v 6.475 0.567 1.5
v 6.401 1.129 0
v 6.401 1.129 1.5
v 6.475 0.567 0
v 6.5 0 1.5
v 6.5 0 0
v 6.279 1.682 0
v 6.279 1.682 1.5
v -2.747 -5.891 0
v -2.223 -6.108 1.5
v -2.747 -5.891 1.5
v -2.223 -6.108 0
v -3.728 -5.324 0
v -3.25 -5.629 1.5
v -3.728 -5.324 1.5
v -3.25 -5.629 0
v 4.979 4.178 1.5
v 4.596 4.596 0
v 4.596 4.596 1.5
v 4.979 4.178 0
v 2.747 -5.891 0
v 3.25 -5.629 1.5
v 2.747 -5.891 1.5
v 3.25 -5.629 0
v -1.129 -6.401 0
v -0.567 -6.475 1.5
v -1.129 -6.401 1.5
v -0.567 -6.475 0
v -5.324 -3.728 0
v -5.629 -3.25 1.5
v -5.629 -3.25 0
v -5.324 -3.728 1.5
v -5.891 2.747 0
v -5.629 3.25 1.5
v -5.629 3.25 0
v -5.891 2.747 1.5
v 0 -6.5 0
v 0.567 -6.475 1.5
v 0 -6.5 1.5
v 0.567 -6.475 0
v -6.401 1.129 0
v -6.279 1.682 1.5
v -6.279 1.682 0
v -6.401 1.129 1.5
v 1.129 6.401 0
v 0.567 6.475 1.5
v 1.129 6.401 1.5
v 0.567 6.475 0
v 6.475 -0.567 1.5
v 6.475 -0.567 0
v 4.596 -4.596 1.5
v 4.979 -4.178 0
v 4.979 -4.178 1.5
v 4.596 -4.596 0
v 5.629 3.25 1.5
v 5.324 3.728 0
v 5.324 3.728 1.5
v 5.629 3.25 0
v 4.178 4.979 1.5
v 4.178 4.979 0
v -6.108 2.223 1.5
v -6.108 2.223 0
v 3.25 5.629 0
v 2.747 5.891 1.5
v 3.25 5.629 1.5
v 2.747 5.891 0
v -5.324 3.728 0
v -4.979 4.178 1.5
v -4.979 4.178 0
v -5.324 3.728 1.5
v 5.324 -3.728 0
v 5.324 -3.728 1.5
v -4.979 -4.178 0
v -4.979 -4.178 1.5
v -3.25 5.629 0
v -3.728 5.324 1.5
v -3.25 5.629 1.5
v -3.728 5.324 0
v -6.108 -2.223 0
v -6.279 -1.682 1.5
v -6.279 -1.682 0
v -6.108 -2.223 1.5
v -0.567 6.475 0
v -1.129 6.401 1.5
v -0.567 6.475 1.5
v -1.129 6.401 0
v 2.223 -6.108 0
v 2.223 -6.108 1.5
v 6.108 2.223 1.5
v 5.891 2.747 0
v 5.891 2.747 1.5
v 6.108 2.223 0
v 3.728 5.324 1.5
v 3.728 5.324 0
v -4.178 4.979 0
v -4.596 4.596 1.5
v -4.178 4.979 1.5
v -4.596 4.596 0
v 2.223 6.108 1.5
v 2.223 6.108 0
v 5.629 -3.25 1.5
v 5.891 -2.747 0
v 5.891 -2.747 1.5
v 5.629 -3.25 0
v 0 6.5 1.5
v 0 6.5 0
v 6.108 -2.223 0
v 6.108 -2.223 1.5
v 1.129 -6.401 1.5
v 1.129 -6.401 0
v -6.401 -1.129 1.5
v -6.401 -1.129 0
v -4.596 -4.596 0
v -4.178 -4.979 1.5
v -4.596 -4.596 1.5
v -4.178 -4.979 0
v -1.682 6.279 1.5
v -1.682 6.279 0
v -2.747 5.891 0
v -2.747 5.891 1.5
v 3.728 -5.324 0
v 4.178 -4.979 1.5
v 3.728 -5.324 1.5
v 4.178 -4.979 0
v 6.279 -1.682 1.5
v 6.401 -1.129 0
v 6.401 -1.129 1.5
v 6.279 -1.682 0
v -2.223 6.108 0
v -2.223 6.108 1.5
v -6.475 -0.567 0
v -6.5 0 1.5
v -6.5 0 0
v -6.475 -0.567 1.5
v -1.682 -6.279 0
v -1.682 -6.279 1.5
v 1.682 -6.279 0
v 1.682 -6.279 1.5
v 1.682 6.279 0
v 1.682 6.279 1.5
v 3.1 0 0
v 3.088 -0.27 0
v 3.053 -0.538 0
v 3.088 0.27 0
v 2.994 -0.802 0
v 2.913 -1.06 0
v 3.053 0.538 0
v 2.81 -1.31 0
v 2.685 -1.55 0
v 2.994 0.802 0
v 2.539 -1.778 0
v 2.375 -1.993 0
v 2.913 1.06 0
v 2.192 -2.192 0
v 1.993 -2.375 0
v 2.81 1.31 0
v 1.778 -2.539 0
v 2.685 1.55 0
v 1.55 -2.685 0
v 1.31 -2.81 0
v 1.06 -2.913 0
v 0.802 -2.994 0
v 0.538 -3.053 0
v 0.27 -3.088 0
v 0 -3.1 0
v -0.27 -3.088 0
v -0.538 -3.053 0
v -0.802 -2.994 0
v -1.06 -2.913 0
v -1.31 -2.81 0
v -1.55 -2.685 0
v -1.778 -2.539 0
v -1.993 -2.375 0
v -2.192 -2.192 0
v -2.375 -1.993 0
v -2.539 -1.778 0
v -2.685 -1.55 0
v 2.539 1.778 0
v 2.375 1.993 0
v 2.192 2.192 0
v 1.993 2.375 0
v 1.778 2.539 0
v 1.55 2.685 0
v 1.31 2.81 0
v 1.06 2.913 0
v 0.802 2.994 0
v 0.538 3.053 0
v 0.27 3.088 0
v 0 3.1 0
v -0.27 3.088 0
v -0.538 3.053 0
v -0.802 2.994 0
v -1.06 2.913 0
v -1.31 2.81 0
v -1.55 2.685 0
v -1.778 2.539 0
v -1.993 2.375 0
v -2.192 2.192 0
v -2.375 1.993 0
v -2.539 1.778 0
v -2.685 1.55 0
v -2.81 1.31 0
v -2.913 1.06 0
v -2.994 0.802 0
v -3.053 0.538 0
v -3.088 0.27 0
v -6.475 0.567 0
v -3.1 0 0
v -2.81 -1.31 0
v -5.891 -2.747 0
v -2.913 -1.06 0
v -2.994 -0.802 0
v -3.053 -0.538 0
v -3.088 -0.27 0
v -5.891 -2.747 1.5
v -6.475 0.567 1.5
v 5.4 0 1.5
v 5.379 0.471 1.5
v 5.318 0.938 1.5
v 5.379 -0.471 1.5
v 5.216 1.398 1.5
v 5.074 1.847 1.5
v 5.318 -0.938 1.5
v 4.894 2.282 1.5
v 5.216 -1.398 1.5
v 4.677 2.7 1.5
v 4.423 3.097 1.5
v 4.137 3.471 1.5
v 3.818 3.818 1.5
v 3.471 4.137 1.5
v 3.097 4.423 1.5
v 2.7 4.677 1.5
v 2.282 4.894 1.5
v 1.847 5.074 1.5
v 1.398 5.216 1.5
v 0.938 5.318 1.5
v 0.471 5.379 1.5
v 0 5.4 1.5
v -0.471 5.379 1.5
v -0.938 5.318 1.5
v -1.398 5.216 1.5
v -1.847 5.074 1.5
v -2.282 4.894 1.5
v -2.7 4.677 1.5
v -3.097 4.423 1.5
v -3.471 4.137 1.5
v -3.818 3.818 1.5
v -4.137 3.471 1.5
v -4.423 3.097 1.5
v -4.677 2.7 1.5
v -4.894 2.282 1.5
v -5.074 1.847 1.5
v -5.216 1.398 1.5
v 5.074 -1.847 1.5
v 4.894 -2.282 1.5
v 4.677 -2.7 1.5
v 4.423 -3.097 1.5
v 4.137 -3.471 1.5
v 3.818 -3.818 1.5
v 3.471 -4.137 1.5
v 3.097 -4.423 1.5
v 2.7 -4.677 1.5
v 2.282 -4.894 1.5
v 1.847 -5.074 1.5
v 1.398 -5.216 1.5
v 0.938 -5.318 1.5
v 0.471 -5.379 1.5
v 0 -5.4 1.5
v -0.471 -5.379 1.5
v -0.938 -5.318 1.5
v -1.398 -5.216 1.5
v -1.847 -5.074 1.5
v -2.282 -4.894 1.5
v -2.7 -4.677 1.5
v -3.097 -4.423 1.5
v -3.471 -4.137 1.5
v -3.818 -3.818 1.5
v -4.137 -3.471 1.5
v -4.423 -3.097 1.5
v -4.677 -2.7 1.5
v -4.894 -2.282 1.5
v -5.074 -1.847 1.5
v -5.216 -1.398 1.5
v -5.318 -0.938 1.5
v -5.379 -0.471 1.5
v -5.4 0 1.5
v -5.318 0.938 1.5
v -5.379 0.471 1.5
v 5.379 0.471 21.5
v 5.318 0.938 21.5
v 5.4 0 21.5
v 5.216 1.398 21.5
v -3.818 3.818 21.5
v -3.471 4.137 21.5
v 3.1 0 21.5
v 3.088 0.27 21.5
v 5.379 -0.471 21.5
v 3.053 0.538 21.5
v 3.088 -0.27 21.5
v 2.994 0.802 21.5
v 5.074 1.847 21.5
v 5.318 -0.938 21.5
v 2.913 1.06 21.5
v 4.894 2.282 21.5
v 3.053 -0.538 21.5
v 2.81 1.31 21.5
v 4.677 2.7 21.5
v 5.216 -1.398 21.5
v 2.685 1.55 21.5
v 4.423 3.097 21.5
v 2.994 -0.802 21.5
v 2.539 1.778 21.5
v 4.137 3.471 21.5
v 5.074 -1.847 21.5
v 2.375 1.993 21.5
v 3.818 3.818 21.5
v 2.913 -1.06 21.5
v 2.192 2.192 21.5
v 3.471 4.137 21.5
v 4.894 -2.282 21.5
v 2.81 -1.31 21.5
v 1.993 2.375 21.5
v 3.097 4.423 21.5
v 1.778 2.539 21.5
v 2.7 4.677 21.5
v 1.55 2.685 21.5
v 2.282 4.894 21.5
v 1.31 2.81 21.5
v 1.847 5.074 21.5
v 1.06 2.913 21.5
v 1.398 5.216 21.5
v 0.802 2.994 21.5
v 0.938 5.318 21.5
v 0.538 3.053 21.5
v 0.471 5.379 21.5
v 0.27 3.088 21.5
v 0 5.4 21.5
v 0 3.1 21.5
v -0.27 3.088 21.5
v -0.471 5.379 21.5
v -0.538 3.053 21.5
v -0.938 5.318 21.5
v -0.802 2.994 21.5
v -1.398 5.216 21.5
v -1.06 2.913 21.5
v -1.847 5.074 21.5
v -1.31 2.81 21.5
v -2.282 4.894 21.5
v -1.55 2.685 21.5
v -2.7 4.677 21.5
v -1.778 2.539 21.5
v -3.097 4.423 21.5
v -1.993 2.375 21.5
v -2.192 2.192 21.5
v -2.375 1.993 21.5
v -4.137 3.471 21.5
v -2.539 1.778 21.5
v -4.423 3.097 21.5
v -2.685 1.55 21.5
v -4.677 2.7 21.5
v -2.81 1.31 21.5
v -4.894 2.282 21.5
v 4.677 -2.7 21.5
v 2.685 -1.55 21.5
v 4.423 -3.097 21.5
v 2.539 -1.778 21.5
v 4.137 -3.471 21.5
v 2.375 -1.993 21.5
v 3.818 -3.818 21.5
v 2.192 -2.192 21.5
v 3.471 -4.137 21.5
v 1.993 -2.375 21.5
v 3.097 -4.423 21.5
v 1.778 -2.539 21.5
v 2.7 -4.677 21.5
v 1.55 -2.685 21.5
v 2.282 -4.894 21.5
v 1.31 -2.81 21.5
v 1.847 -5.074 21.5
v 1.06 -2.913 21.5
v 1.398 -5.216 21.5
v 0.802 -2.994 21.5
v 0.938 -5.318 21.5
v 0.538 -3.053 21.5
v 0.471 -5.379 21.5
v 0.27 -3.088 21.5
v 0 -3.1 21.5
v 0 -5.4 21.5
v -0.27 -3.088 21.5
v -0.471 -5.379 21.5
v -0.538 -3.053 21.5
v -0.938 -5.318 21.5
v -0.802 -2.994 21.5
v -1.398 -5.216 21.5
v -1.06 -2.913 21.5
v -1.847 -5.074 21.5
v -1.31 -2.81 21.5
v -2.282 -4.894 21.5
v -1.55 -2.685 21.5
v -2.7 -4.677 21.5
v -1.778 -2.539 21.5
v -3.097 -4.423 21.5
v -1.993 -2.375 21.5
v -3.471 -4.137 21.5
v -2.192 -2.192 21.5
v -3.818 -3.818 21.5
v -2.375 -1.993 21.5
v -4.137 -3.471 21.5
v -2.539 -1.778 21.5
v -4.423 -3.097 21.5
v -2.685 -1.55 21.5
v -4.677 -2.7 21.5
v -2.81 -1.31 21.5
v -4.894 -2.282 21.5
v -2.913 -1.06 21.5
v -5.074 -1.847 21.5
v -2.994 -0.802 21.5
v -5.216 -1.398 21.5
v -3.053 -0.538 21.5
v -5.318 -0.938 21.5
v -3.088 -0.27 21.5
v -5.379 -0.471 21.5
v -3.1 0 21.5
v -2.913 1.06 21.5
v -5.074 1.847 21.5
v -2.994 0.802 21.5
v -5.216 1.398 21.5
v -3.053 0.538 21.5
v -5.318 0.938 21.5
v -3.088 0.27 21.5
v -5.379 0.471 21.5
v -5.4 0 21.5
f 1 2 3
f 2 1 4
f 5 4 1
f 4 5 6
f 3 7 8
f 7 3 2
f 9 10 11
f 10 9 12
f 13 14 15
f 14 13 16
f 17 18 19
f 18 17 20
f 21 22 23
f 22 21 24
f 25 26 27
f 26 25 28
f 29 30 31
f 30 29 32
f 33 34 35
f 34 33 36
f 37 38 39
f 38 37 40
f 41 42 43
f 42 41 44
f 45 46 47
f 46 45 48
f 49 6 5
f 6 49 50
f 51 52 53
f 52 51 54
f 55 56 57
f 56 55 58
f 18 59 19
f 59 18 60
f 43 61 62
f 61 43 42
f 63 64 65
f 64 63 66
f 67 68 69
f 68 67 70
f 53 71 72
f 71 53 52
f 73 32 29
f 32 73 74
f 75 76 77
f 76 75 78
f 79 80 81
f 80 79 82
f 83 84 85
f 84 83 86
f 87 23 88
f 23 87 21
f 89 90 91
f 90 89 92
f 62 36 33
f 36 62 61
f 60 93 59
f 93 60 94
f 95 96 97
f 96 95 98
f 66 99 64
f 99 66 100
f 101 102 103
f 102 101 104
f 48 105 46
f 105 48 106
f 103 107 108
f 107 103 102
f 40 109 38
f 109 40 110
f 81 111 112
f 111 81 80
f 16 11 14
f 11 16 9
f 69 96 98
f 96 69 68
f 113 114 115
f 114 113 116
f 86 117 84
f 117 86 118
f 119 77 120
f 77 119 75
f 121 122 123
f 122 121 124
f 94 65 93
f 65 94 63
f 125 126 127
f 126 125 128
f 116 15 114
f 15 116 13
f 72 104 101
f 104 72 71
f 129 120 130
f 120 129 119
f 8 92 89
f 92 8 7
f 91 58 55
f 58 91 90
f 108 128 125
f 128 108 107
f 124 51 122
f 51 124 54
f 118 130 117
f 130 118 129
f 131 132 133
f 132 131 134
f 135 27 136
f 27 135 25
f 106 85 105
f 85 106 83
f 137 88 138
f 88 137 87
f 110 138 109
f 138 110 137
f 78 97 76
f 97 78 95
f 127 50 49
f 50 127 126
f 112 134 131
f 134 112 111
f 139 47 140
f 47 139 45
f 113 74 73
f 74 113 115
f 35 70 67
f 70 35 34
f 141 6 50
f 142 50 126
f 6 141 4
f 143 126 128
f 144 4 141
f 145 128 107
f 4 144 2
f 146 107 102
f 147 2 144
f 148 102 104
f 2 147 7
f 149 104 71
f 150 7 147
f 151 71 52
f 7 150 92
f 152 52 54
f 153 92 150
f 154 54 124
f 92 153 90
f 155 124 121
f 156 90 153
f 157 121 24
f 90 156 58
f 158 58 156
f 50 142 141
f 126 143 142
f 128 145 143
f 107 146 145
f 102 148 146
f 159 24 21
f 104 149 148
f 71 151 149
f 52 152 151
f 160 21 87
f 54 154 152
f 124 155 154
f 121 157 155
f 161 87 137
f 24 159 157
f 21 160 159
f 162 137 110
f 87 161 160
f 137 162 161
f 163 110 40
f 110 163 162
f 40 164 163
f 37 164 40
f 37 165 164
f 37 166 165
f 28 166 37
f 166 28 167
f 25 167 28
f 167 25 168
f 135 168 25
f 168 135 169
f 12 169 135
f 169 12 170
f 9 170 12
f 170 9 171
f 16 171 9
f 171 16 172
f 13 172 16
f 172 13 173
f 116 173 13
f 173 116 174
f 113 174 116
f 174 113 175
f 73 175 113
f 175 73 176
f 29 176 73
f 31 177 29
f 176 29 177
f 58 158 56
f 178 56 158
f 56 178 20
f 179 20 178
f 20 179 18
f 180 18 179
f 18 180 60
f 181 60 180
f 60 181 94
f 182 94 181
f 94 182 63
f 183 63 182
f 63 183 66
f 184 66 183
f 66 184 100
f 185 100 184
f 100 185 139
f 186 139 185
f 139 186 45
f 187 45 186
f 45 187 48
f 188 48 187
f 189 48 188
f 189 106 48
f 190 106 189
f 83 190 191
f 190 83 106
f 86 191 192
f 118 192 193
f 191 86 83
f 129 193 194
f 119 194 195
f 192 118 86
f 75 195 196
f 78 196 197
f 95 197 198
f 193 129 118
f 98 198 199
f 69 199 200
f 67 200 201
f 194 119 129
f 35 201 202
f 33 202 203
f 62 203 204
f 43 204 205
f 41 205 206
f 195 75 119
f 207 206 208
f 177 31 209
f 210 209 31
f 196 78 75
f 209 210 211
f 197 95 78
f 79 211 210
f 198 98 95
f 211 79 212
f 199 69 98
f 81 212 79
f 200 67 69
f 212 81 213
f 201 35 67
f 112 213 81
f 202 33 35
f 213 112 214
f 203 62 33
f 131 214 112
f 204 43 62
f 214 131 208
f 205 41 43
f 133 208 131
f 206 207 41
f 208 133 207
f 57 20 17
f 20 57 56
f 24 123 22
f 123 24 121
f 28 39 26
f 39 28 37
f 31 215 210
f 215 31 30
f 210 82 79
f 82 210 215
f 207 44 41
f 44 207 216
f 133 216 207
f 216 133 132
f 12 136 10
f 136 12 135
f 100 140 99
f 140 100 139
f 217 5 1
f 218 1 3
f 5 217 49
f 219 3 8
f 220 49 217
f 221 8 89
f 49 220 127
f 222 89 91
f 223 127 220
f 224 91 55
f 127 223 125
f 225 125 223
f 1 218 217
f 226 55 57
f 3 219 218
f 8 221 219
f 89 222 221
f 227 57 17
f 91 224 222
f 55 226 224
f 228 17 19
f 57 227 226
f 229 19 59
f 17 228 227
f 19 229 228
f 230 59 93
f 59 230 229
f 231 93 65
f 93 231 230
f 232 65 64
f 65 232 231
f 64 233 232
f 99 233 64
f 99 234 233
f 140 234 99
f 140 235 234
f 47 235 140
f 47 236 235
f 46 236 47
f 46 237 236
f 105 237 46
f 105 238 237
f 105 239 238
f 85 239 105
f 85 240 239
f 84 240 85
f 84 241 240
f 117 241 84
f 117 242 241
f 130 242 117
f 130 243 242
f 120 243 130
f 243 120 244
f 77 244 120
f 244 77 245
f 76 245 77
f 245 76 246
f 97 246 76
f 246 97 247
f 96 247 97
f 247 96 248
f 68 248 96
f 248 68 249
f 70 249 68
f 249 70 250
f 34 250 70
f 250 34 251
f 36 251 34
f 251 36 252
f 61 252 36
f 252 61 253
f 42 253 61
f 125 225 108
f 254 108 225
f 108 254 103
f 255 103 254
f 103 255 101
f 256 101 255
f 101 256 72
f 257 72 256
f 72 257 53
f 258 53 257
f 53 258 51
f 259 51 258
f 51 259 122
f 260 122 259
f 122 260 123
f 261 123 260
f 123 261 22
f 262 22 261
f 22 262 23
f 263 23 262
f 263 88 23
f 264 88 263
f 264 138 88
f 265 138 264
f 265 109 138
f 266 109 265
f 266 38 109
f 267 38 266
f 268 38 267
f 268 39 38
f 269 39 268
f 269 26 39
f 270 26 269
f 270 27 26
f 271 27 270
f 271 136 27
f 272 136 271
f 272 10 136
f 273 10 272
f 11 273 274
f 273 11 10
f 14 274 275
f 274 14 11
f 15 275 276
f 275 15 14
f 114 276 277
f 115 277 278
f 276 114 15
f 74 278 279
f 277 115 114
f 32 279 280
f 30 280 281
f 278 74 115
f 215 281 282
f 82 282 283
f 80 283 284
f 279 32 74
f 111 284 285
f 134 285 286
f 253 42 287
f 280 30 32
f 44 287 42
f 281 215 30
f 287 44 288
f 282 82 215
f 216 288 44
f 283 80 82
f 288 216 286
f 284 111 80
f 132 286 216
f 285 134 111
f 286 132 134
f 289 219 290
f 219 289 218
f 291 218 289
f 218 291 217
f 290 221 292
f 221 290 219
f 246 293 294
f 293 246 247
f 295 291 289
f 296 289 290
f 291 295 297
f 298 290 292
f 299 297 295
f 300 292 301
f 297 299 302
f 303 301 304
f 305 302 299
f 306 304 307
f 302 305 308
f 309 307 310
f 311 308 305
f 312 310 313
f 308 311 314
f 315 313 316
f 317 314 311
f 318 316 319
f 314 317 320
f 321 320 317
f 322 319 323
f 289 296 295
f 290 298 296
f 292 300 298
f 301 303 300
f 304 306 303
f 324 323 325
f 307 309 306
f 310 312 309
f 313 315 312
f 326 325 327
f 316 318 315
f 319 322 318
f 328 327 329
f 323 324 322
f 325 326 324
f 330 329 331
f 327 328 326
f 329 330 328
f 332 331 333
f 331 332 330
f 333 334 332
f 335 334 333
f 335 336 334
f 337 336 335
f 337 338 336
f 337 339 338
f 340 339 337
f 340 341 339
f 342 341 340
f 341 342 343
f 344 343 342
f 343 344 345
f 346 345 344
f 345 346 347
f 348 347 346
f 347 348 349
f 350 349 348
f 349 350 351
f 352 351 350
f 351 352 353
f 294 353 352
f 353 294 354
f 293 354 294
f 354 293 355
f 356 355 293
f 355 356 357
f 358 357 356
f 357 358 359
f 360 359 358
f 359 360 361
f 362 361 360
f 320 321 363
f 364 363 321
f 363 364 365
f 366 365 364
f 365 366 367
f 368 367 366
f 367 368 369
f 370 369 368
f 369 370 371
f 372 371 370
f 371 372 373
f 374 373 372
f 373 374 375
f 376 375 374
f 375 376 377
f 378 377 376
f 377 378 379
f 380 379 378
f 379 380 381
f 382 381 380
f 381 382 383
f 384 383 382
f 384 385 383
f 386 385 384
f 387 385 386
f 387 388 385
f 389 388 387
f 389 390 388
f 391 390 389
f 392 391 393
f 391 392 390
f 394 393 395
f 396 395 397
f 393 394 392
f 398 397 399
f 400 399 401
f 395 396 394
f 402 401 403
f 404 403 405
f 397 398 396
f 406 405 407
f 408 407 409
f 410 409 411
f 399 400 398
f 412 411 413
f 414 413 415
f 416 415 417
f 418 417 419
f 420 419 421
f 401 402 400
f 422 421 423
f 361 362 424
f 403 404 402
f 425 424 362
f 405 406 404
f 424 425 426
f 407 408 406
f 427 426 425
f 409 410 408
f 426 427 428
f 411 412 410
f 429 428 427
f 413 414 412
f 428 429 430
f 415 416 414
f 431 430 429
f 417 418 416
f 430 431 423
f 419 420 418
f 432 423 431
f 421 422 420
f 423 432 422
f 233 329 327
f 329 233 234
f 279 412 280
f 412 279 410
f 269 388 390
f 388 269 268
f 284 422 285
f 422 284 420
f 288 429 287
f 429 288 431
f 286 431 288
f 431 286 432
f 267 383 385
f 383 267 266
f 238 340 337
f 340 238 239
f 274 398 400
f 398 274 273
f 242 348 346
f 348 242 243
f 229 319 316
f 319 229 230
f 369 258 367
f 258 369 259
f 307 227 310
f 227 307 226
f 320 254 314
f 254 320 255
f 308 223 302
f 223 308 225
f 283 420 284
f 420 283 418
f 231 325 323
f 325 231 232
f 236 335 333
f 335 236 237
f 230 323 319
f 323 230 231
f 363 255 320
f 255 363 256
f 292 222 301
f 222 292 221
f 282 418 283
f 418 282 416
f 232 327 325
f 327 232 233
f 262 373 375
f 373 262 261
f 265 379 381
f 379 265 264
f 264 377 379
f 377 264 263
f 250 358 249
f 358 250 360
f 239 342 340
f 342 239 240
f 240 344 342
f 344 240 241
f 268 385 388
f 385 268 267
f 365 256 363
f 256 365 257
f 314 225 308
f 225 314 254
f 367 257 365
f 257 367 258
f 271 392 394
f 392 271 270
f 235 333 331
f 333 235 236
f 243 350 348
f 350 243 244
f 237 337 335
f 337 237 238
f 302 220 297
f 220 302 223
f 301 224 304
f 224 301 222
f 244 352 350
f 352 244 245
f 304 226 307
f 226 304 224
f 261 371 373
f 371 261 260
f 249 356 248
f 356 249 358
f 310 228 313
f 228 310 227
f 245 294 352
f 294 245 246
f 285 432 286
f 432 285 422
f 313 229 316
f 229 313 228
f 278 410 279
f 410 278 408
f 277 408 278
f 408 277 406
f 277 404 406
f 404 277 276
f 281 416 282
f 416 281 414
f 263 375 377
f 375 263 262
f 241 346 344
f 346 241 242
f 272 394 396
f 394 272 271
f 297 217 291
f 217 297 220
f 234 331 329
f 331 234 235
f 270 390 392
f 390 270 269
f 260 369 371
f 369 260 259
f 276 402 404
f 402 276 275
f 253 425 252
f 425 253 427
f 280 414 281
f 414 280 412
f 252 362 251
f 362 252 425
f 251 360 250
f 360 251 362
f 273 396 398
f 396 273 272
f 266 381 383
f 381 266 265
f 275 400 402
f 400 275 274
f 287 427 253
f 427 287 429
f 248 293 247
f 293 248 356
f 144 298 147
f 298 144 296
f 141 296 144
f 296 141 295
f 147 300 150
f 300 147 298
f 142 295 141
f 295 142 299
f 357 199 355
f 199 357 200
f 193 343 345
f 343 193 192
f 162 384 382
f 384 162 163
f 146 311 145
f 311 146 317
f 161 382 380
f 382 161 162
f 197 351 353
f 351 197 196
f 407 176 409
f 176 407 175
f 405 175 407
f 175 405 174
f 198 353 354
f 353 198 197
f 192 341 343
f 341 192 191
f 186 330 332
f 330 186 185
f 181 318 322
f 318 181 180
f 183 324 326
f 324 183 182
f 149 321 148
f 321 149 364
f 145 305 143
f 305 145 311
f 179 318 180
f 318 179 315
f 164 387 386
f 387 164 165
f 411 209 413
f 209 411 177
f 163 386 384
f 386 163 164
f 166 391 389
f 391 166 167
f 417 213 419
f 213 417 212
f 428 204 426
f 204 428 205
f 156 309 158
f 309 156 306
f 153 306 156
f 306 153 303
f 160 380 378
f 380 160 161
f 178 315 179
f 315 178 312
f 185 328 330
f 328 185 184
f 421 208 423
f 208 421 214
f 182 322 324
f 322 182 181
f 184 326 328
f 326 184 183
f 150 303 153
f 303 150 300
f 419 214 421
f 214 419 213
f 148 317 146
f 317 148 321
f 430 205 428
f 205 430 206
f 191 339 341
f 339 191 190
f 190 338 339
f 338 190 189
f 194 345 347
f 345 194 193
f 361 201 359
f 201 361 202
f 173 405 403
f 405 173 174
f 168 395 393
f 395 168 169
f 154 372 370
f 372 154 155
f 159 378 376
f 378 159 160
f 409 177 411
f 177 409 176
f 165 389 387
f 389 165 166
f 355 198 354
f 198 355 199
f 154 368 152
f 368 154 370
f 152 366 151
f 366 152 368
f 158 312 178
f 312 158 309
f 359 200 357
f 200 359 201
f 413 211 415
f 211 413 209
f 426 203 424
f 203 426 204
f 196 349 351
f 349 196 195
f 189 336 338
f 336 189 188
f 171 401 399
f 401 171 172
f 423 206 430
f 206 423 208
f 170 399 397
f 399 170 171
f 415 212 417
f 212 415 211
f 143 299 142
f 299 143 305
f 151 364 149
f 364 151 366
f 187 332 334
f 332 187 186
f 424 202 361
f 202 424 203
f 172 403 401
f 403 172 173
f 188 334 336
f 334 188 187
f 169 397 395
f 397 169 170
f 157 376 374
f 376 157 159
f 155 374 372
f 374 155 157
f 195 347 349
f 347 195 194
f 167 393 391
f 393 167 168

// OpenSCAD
// Adapter sleeve - a collar with a sleeve body that lines a 1.5 mL tube rack hole to hold a
// 0.2 mL PCR tube, with a through bore. NOVEL general part (a generic tube adapter).
//

top_d     = 13;
collar_h  = 1.5;
body_d    = 10.8;
height    = 21.5;
bore      = 6.2;
min_d     = 1.6;

$fn = 72;

difference() {
    union() {
        cylinder(h = collar_h, d = top_d);
        cylinder(h = height, d = body_d);
    };
    translate([0, 0, -1]) cylinder(h = height + 2, d = bore);
}
